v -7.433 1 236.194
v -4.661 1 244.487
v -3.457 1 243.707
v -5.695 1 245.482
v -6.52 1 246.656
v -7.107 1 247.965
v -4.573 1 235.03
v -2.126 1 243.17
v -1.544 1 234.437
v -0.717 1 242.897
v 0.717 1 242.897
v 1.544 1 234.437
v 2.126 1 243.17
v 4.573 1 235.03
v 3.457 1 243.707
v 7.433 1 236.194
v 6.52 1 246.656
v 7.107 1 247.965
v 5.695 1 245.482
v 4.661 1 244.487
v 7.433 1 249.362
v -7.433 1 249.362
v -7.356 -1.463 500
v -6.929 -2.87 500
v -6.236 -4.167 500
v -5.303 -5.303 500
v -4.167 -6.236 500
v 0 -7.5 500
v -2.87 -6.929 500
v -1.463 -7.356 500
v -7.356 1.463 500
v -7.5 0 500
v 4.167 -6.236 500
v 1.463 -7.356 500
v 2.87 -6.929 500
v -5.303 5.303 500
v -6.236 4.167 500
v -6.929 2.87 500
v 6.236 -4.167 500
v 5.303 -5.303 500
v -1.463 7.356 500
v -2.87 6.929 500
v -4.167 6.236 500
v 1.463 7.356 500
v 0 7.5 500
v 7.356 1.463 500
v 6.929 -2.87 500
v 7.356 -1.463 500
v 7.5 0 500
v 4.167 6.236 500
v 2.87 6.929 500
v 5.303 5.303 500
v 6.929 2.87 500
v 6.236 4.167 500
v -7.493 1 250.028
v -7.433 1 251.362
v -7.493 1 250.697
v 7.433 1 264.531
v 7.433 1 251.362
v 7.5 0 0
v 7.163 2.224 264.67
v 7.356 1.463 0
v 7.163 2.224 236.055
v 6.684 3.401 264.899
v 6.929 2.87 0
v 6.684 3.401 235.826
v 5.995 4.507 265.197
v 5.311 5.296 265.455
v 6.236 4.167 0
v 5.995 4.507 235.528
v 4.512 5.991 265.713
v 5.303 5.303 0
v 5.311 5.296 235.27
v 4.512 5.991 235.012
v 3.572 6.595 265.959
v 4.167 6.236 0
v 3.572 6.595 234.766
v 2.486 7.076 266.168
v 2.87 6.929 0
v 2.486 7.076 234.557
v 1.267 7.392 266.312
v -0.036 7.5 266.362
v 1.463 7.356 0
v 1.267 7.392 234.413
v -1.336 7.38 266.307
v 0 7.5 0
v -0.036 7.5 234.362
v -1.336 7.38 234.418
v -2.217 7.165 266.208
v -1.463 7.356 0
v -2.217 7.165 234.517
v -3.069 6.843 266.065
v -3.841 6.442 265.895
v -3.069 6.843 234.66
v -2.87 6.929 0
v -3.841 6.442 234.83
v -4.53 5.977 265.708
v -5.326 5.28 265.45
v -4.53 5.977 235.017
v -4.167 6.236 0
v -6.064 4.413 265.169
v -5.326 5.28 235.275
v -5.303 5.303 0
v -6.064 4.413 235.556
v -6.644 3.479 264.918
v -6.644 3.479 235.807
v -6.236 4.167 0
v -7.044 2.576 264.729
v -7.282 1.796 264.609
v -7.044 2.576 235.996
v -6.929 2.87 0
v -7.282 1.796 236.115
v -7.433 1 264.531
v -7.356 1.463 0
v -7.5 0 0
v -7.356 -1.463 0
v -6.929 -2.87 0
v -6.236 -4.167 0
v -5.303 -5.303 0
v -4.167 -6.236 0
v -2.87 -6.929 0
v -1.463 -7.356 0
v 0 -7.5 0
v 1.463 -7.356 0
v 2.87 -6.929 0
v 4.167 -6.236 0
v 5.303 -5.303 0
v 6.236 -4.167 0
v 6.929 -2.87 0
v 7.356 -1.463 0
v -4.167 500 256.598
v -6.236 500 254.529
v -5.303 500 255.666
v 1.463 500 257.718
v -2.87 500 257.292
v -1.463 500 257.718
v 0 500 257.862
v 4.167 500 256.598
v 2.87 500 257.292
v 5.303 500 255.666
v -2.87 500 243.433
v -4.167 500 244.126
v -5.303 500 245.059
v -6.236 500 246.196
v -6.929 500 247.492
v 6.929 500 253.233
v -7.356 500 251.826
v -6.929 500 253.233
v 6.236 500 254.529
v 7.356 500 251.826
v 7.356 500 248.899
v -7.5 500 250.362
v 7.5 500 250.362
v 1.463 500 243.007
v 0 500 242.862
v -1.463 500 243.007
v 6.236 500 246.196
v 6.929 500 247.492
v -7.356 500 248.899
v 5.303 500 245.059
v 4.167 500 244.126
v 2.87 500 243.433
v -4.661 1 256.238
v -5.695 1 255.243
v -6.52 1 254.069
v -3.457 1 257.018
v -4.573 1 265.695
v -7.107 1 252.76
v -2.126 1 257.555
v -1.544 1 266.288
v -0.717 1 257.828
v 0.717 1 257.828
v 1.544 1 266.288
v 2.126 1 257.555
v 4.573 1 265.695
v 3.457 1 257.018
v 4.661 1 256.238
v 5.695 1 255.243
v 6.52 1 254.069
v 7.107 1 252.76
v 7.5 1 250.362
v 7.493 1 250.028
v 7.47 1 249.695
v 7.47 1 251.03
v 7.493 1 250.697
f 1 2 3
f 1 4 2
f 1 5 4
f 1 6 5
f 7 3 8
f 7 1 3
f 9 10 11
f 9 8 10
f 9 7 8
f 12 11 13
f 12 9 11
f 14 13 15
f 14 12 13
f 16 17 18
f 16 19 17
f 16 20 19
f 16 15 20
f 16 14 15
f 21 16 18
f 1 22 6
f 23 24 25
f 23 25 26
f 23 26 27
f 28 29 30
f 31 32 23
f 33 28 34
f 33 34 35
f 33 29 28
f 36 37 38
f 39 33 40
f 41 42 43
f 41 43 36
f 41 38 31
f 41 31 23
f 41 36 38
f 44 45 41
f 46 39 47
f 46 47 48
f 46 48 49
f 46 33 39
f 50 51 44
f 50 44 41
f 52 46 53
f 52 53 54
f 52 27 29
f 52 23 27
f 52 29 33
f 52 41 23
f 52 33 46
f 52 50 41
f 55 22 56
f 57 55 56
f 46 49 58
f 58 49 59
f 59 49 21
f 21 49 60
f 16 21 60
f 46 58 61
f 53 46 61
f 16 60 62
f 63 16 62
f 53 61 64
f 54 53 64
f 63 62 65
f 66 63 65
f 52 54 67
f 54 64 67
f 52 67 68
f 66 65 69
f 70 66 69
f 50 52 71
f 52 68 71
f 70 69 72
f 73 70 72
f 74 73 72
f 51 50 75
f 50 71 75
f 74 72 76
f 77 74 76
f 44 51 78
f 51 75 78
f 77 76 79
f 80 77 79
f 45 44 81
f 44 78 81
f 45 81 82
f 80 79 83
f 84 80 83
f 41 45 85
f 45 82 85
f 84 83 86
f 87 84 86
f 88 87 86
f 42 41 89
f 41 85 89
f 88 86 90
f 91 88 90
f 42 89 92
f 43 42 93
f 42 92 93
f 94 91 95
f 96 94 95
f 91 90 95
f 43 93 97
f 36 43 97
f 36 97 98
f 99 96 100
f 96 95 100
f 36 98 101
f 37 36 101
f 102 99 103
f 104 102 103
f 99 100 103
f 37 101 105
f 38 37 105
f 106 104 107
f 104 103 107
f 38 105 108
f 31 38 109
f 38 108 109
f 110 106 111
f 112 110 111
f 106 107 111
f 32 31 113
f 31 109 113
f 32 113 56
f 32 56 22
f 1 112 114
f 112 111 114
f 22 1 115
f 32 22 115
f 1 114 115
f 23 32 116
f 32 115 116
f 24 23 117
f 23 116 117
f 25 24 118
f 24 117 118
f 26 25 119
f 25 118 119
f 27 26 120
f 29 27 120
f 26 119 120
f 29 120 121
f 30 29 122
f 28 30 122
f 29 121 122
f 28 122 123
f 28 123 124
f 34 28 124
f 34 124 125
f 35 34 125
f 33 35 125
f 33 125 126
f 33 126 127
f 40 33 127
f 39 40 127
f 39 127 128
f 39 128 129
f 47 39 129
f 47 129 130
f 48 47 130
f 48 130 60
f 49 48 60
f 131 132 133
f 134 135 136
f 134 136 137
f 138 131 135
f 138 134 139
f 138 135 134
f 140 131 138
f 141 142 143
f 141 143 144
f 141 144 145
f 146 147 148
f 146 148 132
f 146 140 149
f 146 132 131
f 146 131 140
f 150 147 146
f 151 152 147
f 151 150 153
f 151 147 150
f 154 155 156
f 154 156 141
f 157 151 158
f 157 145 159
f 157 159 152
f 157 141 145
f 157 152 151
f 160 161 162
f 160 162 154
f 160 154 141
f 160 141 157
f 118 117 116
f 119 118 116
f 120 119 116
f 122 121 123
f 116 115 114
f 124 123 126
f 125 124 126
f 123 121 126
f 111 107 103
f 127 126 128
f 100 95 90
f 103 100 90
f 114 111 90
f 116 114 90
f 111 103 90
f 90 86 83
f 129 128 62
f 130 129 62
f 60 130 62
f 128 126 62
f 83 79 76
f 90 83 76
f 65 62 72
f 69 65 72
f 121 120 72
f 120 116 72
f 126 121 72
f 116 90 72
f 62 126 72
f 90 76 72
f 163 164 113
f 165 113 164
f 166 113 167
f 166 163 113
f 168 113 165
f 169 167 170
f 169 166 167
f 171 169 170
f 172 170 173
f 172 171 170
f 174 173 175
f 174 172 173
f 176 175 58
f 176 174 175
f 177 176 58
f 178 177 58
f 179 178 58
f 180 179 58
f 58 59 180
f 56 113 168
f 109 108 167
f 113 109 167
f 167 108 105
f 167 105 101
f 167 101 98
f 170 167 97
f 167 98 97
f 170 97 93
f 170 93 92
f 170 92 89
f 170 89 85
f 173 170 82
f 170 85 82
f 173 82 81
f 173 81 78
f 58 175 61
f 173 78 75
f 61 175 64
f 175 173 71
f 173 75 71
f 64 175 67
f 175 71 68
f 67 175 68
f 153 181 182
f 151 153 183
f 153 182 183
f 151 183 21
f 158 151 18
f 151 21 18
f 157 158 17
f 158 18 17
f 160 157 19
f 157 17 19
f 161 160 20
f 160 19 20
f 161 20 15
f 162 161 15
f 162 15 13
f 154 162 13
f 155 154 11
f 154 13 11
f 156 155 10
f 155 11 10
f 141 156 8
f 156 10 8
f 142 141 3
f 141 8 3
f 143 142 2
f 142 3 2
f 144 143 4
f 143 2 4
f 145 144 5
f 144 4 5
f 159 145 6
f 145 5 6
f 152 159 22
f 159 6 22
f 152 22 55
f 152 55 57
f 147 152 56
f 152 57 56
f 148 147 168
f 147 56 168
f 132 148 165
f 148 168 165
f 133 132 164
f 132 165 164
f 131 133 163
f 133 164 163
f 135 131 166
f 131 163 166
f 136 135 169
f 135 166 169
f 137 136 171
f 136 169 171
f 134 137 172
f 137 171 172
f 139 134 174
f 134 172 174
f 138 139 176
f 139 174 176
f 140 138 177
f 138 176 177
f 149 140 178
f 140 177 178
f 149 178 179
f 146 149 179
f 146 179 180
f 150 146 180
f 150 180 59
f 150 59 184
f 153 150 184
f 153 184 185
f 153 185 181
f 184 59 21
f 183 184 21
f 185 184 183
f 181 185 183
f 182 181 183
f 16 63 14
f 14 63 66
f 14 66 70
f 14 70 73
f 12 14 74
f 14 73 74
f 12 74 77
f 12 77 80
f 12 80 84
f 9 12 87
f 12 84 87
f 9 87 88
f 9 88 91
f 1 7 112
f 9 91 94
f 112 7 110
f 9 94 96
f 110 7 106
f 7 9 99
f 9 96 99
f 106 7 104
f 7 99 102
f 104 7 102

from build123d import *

# Parameters (mm, degrees)
SKETCH1_R           = 7.5
BOSS_EXTRUDE1_DEPTH = 500
SKETCH2_R           = 16
CUT_EXTRUDE1_DEPTH  = 15
SKETCH4_R           = 7.5
BOSS_EXTRUDE2_DEPTH = 499


with BuildPart() as part:
    # Sketch1 → Boss-Extrude1 (new body)
    with BuildSketch(Plane.XY):
        Circle(SKETCH1_R)
    extrude(amount=BOSS_EXTRUDE1_DEPTH)

    # Sketch2 → Cut-Extrude1 (cut)
    with BuildSketch(Plane(origin=(0, 16, 0), x_dir=(1, 0, 0), z_dir=(0, 1, 0))):
        with Locations((0, -250.362407272)):
            Circle(SKETCH2_R)
    extrude(amount=-CUT_EXTRUDE1_DEPTH, mode=Mode.SUBTRACT)

    # Sketch4 → Boss-Extrude2 (add)
    with BuildSketch(Plane(origin=(0, 1, 0), x_dir=(1, 0, 0), z_dir=(0, 1, 0))):
        with Locations((0, -250.362407272)):
            Circle(SKETCH4_R)
    extrude(amount=BOSS_EXTRUDE2_DEPTH)


solid = part.part
